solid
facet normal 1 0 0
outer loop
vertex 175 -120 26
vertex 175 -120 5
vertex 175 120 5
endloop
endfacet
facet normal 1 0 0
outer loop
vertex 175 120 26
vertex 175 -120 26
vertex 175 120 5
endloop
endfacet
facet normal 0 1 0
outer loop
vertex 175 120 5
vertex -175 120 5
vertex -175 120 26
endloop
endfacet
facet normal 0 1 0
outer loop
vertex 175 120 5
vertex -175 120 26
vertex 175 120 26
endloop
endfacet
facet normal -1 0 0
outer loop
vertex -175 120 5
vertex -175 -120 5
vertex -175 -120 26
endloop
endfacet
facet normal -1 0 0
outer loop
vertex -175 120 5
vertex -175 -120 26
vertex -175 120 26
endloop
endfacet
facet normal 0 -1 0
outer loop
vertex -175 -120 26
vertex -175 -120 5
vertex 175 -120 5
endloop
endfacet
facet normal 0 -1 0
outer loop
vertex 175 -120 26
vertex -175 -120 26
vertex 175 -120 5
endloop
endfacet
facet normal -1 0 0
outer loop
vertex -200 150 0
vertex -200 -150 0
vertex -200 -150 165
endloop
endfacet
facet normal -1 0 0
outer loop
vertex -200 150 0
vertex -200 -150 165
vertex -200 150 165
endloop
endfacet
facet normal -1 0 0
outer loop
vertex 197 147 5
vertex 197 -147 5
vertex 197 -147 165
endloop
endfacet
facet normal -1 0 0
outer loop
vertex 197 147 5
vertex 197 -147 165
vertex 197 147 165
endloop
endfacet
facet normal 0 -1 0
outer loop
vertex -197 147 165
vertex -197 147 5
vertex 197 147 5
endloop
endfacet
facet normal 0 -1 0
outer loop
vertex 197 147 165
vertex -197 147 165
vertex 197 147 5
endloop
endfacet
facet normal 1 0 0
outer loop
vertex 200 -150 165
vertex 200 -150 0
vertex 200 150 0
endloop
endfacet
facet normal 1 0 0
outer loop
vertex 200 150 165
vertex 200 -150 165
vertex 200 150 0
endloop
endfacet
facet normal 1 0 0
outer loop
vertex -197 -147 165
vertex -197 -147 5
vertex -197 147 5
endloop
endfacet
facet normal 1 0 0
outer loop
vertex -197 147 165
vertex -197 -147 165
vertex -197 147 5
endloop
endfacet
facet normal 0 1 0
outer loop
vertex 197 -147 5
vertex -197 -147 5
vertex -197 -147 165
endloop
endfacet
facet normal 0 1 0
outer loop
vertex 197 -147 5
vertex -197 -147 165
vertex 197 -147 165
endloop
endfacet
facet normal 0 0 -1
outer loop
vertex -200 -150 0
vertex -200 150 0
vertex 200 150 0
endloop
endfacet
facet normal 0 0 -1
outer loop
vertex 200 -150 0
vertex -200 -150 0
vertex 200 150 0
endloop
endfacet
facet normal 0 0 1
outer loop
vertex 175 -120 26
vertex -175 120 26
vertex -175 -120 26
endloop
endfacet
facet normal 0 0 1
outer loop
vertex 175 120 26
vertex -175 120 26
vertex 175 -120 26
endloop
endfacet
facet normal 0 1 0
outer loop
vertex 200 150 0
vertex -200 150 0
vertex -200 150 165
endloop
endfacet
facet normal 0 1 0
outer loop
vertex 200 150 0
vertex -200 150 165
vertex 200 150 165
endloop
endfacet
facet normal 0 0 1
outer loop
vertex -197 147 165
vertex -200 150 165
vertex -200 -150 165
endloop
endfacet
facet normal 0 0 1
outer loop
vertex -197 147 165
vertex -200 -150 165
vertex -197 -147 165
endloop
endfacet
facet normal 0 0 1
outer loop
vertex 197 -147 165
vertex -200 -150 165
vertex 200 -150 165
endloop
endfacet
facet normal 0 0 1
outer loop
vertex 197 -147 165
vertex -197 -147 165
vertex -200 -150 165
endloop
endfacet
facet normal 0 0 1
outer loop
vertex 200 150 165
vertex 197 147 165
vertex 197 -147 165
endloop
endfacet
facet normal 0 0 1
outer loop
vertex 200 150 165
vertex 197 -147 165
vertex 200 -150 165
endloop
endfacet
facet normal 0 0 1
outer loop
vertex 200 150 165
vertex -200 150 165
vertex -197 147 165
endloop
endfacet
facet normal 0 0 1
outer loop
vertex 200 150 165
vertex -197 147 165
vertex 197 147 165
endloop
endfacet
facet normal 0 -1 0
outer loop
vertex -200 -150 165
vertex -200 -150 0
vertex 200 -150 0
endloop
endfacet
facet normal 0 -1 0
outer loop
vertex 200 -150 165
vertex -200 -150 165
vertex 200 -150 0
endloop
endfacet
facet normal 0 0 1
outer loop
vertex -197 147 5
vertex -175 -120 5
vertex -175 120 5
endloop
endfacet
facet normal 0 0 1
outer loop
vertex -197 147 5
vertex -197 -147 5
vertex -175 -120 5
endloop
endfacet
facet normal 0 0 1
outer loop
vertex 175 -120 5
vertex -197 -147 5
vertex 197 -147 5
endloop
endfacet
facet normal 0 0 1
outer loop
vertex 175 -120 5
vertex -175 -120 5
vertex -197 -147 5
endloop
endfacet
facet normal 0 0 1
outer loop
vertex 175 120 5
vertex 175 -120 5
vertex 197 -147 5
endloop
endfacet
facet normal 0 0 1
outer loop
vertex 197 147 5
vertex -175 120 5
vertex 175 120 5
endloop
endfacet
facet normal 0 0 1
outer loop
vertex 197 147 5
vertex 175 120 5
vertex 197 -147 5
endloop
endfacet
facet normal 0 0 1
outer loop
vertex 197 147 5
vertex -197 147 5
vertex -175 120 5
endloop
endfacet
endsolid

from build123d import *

# Parameters (mm, degrees)
SKETCH1_W           = 400
SKETCH1_H           = 300
BOSS_EXTRUDE1_DEPTH = 5
SKETCH2_W           = 400
SKETCH2_H           = 300
SKETCH2_W_2         = 394
SKETCH2_H_2         = 294
BOSS_EXTRUDE2_DEPTH = 165
SKETCH3_W           = 350
SKETCH3_H           = 240
BOSS_EXTRUDE3_DEPTH = 26


with BuildPart() as part:
    # Sketch1 → Boss-Extrude1 (new body)
    with BuildSketch(Plane.XY):
        Rectangle(SKETCH1_W, SKETCH1_H)
    extrude(amount=BOSS_EXTRUDE1_DEPTH)

    # Sketch2 → Boss-Extrude2 (add)
    with BuildSketch(Plane.XY):
        Rectangle(SKETCH2_W, SKETCH2_H)
        Rectangle(SKETCH2_W_2, SKETCH2_H_2, mode=Mode.SUBTRACT)
    extrude(amount=BOSS_EXTRUDE2_DEPTH)

    # Sketch3 → Boss-Extrude3 (add)
    with BuildSketch(Plane.XY):
        Rectangle(SKETCH3_W, SKETCH3_H)
    extrude(amount=BOSS_EXTRUDE3_DEPTH)


solid = part.part
